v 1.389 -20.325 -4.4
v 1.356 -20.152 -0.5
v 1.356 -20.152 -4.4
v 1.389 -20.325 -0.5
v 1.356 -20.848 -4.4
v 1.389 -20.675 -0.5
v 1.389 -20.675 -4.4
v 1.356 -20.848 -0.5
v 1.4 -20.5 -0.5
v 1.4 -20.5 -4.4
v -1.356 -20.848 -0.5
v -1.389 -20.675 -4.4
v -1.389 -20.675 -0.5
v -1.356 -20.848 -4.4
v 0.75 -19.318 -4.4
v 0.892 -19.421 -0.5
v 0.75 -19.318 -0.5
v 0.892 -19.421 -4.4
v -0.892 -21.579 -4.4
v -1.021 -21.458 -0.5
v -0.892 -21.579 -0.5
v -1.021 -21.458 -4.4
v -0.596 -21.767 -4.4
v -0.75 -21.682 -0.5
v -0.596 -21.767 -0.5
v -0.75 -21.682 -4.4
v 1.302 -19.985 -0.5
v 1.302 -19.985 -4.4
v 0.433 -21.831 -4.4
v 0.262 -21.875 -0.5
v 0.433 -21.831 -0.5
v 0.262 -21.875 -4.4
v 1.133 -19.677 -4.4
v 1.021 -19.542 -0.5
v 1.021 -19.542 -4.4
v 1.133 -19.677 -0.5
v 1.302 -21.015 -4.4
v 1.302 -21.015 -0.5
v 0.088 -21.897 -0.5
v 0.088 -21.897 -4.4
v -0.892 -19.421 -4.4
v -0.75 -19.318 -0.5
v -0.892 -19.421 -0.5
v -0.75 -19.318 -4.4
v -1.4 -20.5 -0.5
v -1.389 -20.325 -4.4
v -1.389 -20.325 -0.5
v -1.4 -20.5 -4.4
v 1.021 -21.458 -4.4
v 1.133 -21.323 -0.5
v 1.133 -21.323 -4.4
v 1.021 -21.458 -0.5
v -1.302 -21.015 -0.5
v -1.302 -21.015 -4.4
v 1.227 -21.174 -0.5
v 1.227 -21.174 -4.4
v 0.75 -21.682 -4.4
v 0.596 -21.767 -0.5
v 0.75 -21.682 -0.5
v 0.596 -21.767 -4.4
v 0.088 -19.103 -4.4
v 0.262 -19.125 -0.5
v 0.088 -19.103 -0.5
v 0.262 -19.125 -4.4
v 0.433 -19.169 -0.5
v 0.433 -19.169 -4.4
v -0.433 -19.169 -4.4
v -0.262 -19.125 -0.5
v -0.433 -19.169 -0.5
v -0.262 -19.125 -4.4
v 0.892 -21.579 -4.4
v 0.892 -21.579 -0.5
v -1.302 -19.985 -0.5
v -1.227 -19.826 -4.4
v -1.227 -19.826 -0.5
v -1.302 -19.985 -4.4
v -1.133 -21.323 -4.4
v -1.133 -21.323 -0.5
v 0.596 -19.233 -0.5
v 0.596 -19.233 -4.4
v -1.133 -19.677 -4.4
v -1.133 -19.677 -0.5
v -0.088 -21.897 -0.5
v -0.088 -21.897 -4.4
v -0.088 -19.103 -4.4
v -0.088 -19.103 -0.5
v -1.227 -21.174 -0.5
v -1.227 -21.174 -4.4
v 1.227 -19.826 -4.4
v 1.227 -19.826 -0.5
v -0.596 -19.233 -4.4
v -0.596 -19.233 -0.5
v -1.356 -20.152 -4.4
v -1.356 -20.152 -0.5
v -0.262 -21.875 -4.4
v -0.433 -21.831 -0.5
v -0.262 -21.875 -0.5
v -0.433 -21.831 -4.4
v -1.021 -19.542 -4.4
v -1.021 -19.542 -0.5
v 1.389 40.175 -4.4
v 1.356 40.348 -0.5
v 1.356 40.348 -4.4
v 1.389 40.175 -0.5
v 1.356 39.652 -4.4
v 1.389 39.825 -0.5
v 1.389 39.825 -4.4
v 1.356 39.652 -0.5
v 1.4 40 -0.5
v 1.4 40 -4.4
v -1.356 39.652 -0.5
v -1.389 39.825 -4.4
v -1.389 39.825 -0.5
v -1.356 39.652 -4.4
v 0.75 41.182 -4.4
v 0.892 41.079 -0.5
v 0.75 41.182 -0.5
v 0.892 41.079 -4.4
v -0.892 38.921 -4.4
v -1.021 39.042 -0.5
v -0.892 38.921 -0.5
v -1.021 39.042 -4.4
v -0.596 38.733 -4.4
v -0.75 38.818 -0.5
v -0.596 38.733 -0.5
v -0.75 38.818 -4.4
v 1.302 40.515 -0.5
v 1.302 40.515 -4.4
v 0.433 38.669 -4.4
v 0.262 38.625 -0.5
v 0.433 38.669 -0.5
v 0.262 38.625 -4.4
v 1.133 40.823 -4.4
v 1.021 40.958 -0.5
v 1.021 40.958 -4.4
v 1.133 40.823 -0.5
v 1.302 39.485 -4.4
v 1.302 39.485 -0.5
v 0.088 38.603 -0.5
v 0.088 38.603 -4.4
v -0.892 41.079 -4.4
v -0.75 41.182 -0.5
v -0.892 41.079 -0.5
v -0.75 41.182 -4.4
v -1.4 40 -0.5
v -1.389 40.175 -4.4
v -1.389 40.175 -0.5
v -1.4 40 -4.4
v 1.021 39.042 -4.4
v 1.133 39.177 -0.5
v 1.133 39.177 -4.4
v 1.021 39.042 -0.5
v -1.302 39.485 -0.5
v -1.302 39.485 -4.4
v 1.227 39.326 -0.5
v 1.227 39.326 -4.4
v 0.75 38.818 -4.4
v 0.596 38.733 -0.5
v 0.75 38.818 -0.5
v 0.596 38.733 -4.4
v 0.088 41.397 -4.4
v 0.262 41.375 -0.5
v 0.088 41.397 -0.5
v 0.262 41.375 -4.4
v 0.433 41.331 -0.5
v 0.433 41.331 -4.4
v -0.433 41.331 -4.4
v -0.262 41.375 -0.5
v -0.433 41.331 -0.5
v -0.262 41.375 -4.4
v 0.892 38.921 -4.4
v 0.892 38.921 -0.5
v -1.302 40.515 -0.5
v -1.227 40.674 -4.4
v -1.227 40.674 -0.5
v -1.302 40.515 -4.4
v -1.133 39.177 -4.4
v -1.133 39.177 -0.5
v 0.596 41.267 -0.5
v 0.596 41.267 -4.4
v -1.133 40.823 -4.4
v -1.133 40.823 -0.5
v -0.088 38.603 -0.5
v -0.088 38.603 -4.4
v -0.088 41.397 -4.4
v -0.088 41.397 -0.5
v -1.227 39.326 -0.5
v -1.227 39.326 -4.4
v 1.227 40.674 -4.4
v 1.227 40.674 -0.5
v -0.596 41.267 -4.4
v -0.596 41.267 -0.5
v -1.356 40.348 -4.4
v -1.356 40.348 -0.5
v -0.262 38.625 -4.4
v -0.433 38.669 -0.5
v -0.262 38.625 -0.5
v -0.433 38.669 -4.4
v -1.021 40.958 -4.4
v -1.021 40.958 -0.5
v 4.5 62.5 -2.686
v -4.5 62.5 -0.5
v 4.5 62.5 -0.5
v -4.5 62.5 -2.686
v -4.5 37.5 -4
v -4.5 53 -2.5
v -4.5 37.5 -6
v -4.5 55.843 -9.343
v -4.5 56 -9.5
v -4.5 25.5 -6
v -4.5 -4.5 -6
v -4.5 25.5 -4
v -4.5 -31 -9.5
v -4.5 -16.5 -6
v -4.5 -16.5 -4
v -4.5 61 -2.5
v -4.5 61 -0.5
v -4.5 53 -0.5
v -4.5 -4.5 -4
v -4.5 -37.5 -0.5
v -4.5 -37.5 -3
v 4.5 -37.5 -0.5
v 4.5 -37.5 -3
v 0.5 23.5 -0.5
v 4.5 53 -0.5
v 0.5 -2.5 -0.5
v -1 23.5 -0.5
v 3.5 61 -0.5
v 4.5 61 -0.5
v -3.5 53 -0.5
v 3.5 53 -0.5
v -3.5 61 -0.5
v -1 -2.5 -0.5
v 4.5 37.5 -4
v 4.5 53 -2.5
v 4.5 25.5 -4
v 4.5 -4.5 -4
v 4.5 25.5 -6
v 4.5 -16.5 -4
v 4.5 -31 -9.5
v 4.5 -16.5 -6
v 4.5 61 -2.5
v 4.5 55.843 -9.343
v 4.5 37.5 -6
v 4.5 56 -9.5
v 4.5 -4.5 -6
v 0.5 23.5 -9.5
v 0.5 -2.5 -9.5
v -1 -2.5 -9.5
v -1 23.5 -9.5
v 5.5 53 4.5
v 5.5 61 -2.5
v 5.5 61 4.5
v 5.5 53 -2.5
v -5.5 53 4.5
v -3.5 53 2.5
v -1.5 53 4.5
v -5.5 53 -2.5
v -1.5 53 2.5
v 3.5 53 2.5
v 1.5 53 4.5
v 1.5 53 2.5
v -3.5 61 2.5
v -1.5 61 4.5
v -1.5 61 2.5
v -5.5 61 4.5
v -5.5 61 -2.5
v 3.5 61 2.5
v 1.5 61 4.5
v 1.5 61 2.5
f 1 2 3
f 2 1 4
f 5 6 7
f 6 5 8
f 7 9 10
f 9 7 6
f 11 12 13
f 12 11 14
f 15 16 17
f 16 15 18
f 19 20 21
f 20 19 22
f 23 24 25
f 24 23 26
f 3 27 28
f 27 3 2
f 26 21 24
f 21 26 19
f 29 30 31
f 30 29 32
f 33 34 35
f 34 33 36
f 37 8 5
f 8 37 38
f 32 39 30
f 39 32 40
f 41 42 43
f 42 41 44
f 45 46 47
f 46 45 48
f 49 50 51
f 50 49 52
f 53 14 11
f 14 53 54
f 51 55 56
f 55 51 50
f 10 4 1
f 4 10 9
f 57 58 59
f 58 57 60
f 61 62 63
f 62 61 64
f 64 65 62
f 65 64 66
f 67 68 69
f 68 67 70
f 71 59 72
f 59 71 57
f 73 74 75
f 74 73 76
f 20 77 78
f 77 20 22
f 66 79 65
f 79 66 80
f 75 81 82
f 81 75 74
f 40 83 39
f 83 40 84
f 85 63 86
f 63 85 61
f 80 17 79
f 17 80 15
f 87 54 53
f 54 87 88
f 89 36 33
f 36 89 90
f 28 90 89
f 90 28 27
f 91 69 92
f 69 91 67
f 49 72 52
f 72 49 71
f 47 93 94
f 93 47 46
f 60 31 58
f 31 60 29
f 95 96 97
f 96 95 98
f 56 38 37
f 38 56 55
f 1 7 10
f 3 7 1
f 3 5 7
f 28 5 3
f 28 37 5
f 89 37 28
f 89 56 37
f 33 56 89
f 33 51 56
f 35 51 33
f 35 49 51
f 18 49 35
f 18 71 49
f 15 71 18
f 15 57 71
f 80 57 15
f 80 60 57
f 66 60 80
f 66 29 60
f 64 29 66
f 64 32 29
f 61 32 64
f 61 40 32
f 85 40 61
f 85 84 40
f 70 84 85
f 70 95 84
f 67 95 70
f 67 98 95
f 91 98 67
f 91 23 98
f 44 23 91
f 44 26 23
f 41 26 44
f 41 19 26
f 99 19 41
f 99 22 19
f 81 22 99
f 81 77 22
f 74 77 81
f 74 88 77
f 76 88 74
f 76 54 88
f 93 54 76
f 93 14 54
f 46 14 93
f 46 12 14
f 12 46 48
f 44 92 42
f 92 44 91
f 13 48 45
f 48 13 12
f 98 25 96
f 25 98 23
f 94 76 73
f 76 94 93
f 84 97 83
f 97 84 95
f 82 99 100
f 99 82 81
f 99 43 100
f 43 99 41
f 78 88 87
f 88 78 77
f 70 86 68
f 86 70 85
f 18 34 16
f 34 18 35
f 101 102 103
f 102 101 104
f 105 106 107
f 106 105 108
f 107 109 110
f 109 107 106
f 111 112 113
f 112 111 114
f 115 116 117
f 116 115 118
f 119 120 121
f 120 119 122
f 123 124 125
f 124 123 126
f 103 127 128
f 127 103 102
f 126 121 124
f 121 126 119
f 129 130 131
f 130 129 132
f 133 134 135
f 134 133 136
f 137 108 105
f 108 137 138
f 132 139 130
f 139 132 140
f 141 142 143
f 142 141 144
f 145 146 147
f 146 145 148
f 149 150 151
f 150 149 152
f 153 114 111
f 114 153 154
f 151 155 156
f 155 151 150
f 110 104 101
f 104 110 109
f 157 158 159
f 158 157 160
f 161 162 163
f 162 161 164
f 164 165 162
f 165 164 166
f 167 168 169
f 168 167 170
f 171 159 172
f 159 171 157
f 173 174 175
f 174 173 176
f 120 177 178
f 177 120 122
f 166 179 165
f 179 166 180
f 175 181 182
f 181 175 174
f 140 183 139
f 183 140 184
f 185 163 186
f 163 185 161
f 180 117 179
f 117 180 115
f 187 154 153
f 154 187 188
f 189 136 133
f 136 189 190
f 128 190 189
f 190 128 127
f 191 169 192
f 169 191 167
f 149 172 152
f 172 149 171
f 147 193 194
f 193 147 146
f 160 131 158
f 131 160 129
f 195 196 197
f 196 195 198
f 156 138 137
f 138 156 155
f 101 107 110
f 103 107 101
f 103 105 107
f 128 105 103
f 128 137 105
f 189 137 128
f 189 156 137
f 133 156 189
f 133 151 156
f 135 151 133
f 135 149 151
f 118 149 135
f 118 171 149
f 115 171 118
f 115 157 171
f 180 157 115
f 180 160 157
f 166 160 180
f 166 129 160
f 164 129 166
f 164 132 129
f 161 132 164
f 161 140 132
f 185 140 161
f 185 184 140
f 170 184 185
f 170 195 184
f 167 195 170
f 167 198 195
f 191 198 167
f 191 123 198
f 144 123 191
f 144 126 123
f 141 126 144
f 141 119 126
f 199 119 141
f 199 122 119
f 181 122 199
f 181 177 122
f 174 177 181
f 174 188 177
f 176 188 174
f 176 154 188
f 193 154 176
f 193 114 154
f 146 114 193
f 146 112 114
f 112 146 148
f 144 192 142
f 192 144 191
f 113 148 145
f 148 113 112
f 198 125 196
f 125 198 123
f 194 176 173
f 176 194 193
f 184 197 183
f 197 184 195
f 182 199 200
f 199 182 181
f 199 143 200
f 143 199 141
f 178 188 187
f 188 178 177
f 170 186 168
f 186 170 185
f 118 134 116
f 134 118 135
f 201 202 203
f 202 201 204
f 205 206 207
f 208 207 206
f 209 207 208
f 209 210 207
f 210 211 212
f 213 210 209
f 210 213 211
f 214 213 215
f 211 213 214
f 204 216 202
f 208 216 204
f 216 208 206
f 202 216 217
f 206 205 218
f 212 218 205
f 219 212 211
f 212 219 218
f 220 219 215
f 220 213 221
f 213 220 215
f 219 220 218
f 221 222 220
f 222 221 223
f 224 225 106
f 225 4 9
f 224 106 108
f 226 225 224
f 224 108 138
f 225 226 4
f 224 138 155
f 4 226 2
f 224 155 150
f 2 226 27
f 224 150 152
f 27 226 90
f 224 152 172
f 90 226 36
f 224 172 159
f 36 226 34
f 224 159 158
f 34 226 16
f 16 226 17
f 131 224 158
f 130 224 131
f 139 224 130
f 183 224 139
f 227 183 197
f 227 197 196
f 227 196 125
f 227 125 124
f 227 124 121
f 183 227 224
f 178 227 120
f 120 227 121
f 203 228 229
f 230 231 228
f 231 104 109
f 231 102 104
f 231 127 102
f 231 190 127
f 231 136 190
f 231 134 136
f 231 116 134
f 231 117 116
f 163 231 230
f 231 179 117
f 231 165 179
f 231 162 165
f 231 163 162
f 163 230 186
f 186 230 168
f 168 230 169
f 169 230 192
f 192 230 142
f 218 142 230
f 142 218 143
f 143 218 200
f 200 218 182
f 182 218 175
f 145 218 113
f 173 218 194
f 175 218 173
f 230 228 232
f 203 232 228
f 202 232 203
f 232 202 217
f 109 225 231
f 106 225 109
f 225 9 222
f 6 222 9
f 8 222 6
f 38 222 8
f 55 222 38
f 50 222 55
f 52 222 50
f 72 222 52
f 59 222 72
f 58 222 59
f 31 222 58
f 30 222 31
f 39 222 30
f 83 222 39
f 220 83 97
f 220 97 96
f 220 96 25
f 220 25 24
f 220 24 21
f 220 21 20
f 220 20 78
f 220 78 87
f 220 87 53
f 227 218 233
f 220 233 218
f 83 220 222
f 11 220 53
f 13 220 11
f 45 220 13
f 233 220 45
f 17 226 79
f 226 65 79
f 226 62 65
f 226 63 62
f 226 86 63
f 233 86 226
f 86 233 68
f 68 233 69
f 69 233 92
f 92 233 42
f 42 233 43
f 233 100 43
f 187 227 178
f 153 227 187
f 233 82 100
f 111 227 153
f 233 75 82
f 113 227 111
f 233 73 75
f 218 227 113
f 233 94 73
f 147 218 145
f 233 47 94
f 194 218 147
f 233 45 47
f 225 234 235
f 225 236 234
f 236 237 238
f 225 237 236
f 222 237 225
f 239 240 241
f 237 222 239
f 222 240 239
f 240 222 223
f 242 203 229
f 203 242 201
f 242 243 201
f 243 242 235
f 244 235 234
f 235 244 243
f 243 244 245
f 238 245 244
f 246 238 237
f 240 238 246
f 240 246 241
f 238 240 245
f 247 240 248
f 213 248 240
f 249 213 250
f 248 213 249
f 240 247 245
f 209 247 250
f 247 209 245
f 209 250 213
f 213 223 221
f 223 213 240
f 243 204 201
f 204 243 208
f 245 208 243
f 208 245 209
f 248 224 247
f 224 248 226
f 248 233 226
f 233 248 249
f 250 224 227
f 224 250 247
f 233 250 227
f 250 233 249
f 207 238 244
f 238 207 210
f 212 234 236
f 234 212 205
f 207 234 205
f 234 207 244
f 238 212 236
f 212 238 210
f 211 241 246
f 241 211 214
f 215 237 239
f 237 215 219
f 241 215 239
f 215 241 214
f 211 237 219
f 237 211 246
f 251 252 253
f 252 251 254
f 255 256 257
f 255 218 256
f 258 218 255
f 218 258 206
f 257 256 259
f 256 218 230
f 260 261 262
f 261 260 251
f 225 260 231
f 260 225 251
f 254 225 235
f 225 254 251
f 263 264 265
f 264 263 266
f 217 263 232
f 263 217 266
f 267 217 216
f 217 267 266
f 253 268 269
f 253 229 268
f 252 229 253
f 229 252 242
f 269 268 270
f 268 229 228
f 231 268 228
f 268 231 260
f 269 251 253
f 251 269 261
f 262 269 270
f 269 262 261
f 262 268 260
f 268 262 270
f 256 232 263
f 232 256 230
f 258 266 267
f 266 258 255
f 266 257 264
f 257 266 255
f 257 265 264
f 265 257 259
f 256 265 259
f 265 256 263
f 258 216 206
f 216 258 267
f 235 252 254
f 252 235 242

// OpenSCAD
$fn=50;
BOX_W = 38; // Box Width
BOX_L = 100;// Box Length
BOX_H = 1.0; // Box Height
//SCREW_SIZE = .5; // Screw size in mm
CORNER_RADIUS = 1.0; // Radius of corners
WALL = 1.0;// Wall Thickness

KEEL_WIDTH=9.0;
KEEL_HEIGHT=9.0;
KEEL_LENGTH=100;

VENT_OFFSET = 2.5;
VENT_L = 16.5;
VENT_R = -18.5;
 
difference() {
    union() {
        // keel
        translate([0,62.5,-5])
        rotate([90,0,0])
        difference() {
            linear_extrude(KEEL_LENGTH) square([KEEL_WIDTH, KEEL_HEIGHT], center=true); 
            // front of keel slope
            translate([-5, -5, 93])
            rotate([45, 0, 0])
            #cube([10, 11, 8]);  
            
            // back of keel slope
            translate([-5, -10, 1])
            rotate([-45, 0, 0])
            cube([10, 11, 8]); 
            
            //center cutout - vent
            // y, z, x
            translate([-1.0,-6, 39.0])
            rotate([0,0,0])
            //y, z, x
            #cube([1.5, 12, 26]);
            
            // screw holes
            rotate([90,0,0])
            union() {
                // x,y,z
                //translate([0.0, KEEL_LENGTH-35.0, -4.6]) #cylinder(h=4, d=2.8); 
                translate([0.0, KEEL_LENGTH-17.0, -4.6]) #cylinder(h=4, d=2.8); 
                translate([0.0, KEEL_LENGTH-77.5, -4.6]) #cylinder(h=4, d=2.8);   
            }
            // thru slots for straps
            rotate([90, 0, 0])
            translate([-7.0, 25,-1]) 
            #cube([14, 12, 2]);
            rotate([90, 0, 0])
            translate([-7.0, 67,-1]) 
            #cube([14, 12, 2]);      
        }
        // Inverted L-shaped C-clamp
        difference() {
            translate([KEEL_WIDTH/2-3, KEEL_LENGTH-18, -0.5])
            rotate([90, 0, 0])
            union() {
                // Vertical arm of the C-clamp 2
                translate([2.0, 0, 21]) cube([2, 5, 8]);
                // Horizontal arm of the C-clamp
                rotate([90, 0, 0])
                translate([0, 21, -5]) cube([2, 8, 2]);
                // Vertical arm of the C-clamp 1
                translate([-7, 0, 21]) cube([2, 5, 8]);
                // Horizontal arm of the C-clamp
                rotate([90, 0, 0])
                translate([-5.0, 21,-5]) cube([2, 8, 2]);
                // clamp bed
                rotate([90, 0, 0])
                translate([-7.0, 21,-0]) cube([11, 8, 2]);
            }
        }
    }
}
